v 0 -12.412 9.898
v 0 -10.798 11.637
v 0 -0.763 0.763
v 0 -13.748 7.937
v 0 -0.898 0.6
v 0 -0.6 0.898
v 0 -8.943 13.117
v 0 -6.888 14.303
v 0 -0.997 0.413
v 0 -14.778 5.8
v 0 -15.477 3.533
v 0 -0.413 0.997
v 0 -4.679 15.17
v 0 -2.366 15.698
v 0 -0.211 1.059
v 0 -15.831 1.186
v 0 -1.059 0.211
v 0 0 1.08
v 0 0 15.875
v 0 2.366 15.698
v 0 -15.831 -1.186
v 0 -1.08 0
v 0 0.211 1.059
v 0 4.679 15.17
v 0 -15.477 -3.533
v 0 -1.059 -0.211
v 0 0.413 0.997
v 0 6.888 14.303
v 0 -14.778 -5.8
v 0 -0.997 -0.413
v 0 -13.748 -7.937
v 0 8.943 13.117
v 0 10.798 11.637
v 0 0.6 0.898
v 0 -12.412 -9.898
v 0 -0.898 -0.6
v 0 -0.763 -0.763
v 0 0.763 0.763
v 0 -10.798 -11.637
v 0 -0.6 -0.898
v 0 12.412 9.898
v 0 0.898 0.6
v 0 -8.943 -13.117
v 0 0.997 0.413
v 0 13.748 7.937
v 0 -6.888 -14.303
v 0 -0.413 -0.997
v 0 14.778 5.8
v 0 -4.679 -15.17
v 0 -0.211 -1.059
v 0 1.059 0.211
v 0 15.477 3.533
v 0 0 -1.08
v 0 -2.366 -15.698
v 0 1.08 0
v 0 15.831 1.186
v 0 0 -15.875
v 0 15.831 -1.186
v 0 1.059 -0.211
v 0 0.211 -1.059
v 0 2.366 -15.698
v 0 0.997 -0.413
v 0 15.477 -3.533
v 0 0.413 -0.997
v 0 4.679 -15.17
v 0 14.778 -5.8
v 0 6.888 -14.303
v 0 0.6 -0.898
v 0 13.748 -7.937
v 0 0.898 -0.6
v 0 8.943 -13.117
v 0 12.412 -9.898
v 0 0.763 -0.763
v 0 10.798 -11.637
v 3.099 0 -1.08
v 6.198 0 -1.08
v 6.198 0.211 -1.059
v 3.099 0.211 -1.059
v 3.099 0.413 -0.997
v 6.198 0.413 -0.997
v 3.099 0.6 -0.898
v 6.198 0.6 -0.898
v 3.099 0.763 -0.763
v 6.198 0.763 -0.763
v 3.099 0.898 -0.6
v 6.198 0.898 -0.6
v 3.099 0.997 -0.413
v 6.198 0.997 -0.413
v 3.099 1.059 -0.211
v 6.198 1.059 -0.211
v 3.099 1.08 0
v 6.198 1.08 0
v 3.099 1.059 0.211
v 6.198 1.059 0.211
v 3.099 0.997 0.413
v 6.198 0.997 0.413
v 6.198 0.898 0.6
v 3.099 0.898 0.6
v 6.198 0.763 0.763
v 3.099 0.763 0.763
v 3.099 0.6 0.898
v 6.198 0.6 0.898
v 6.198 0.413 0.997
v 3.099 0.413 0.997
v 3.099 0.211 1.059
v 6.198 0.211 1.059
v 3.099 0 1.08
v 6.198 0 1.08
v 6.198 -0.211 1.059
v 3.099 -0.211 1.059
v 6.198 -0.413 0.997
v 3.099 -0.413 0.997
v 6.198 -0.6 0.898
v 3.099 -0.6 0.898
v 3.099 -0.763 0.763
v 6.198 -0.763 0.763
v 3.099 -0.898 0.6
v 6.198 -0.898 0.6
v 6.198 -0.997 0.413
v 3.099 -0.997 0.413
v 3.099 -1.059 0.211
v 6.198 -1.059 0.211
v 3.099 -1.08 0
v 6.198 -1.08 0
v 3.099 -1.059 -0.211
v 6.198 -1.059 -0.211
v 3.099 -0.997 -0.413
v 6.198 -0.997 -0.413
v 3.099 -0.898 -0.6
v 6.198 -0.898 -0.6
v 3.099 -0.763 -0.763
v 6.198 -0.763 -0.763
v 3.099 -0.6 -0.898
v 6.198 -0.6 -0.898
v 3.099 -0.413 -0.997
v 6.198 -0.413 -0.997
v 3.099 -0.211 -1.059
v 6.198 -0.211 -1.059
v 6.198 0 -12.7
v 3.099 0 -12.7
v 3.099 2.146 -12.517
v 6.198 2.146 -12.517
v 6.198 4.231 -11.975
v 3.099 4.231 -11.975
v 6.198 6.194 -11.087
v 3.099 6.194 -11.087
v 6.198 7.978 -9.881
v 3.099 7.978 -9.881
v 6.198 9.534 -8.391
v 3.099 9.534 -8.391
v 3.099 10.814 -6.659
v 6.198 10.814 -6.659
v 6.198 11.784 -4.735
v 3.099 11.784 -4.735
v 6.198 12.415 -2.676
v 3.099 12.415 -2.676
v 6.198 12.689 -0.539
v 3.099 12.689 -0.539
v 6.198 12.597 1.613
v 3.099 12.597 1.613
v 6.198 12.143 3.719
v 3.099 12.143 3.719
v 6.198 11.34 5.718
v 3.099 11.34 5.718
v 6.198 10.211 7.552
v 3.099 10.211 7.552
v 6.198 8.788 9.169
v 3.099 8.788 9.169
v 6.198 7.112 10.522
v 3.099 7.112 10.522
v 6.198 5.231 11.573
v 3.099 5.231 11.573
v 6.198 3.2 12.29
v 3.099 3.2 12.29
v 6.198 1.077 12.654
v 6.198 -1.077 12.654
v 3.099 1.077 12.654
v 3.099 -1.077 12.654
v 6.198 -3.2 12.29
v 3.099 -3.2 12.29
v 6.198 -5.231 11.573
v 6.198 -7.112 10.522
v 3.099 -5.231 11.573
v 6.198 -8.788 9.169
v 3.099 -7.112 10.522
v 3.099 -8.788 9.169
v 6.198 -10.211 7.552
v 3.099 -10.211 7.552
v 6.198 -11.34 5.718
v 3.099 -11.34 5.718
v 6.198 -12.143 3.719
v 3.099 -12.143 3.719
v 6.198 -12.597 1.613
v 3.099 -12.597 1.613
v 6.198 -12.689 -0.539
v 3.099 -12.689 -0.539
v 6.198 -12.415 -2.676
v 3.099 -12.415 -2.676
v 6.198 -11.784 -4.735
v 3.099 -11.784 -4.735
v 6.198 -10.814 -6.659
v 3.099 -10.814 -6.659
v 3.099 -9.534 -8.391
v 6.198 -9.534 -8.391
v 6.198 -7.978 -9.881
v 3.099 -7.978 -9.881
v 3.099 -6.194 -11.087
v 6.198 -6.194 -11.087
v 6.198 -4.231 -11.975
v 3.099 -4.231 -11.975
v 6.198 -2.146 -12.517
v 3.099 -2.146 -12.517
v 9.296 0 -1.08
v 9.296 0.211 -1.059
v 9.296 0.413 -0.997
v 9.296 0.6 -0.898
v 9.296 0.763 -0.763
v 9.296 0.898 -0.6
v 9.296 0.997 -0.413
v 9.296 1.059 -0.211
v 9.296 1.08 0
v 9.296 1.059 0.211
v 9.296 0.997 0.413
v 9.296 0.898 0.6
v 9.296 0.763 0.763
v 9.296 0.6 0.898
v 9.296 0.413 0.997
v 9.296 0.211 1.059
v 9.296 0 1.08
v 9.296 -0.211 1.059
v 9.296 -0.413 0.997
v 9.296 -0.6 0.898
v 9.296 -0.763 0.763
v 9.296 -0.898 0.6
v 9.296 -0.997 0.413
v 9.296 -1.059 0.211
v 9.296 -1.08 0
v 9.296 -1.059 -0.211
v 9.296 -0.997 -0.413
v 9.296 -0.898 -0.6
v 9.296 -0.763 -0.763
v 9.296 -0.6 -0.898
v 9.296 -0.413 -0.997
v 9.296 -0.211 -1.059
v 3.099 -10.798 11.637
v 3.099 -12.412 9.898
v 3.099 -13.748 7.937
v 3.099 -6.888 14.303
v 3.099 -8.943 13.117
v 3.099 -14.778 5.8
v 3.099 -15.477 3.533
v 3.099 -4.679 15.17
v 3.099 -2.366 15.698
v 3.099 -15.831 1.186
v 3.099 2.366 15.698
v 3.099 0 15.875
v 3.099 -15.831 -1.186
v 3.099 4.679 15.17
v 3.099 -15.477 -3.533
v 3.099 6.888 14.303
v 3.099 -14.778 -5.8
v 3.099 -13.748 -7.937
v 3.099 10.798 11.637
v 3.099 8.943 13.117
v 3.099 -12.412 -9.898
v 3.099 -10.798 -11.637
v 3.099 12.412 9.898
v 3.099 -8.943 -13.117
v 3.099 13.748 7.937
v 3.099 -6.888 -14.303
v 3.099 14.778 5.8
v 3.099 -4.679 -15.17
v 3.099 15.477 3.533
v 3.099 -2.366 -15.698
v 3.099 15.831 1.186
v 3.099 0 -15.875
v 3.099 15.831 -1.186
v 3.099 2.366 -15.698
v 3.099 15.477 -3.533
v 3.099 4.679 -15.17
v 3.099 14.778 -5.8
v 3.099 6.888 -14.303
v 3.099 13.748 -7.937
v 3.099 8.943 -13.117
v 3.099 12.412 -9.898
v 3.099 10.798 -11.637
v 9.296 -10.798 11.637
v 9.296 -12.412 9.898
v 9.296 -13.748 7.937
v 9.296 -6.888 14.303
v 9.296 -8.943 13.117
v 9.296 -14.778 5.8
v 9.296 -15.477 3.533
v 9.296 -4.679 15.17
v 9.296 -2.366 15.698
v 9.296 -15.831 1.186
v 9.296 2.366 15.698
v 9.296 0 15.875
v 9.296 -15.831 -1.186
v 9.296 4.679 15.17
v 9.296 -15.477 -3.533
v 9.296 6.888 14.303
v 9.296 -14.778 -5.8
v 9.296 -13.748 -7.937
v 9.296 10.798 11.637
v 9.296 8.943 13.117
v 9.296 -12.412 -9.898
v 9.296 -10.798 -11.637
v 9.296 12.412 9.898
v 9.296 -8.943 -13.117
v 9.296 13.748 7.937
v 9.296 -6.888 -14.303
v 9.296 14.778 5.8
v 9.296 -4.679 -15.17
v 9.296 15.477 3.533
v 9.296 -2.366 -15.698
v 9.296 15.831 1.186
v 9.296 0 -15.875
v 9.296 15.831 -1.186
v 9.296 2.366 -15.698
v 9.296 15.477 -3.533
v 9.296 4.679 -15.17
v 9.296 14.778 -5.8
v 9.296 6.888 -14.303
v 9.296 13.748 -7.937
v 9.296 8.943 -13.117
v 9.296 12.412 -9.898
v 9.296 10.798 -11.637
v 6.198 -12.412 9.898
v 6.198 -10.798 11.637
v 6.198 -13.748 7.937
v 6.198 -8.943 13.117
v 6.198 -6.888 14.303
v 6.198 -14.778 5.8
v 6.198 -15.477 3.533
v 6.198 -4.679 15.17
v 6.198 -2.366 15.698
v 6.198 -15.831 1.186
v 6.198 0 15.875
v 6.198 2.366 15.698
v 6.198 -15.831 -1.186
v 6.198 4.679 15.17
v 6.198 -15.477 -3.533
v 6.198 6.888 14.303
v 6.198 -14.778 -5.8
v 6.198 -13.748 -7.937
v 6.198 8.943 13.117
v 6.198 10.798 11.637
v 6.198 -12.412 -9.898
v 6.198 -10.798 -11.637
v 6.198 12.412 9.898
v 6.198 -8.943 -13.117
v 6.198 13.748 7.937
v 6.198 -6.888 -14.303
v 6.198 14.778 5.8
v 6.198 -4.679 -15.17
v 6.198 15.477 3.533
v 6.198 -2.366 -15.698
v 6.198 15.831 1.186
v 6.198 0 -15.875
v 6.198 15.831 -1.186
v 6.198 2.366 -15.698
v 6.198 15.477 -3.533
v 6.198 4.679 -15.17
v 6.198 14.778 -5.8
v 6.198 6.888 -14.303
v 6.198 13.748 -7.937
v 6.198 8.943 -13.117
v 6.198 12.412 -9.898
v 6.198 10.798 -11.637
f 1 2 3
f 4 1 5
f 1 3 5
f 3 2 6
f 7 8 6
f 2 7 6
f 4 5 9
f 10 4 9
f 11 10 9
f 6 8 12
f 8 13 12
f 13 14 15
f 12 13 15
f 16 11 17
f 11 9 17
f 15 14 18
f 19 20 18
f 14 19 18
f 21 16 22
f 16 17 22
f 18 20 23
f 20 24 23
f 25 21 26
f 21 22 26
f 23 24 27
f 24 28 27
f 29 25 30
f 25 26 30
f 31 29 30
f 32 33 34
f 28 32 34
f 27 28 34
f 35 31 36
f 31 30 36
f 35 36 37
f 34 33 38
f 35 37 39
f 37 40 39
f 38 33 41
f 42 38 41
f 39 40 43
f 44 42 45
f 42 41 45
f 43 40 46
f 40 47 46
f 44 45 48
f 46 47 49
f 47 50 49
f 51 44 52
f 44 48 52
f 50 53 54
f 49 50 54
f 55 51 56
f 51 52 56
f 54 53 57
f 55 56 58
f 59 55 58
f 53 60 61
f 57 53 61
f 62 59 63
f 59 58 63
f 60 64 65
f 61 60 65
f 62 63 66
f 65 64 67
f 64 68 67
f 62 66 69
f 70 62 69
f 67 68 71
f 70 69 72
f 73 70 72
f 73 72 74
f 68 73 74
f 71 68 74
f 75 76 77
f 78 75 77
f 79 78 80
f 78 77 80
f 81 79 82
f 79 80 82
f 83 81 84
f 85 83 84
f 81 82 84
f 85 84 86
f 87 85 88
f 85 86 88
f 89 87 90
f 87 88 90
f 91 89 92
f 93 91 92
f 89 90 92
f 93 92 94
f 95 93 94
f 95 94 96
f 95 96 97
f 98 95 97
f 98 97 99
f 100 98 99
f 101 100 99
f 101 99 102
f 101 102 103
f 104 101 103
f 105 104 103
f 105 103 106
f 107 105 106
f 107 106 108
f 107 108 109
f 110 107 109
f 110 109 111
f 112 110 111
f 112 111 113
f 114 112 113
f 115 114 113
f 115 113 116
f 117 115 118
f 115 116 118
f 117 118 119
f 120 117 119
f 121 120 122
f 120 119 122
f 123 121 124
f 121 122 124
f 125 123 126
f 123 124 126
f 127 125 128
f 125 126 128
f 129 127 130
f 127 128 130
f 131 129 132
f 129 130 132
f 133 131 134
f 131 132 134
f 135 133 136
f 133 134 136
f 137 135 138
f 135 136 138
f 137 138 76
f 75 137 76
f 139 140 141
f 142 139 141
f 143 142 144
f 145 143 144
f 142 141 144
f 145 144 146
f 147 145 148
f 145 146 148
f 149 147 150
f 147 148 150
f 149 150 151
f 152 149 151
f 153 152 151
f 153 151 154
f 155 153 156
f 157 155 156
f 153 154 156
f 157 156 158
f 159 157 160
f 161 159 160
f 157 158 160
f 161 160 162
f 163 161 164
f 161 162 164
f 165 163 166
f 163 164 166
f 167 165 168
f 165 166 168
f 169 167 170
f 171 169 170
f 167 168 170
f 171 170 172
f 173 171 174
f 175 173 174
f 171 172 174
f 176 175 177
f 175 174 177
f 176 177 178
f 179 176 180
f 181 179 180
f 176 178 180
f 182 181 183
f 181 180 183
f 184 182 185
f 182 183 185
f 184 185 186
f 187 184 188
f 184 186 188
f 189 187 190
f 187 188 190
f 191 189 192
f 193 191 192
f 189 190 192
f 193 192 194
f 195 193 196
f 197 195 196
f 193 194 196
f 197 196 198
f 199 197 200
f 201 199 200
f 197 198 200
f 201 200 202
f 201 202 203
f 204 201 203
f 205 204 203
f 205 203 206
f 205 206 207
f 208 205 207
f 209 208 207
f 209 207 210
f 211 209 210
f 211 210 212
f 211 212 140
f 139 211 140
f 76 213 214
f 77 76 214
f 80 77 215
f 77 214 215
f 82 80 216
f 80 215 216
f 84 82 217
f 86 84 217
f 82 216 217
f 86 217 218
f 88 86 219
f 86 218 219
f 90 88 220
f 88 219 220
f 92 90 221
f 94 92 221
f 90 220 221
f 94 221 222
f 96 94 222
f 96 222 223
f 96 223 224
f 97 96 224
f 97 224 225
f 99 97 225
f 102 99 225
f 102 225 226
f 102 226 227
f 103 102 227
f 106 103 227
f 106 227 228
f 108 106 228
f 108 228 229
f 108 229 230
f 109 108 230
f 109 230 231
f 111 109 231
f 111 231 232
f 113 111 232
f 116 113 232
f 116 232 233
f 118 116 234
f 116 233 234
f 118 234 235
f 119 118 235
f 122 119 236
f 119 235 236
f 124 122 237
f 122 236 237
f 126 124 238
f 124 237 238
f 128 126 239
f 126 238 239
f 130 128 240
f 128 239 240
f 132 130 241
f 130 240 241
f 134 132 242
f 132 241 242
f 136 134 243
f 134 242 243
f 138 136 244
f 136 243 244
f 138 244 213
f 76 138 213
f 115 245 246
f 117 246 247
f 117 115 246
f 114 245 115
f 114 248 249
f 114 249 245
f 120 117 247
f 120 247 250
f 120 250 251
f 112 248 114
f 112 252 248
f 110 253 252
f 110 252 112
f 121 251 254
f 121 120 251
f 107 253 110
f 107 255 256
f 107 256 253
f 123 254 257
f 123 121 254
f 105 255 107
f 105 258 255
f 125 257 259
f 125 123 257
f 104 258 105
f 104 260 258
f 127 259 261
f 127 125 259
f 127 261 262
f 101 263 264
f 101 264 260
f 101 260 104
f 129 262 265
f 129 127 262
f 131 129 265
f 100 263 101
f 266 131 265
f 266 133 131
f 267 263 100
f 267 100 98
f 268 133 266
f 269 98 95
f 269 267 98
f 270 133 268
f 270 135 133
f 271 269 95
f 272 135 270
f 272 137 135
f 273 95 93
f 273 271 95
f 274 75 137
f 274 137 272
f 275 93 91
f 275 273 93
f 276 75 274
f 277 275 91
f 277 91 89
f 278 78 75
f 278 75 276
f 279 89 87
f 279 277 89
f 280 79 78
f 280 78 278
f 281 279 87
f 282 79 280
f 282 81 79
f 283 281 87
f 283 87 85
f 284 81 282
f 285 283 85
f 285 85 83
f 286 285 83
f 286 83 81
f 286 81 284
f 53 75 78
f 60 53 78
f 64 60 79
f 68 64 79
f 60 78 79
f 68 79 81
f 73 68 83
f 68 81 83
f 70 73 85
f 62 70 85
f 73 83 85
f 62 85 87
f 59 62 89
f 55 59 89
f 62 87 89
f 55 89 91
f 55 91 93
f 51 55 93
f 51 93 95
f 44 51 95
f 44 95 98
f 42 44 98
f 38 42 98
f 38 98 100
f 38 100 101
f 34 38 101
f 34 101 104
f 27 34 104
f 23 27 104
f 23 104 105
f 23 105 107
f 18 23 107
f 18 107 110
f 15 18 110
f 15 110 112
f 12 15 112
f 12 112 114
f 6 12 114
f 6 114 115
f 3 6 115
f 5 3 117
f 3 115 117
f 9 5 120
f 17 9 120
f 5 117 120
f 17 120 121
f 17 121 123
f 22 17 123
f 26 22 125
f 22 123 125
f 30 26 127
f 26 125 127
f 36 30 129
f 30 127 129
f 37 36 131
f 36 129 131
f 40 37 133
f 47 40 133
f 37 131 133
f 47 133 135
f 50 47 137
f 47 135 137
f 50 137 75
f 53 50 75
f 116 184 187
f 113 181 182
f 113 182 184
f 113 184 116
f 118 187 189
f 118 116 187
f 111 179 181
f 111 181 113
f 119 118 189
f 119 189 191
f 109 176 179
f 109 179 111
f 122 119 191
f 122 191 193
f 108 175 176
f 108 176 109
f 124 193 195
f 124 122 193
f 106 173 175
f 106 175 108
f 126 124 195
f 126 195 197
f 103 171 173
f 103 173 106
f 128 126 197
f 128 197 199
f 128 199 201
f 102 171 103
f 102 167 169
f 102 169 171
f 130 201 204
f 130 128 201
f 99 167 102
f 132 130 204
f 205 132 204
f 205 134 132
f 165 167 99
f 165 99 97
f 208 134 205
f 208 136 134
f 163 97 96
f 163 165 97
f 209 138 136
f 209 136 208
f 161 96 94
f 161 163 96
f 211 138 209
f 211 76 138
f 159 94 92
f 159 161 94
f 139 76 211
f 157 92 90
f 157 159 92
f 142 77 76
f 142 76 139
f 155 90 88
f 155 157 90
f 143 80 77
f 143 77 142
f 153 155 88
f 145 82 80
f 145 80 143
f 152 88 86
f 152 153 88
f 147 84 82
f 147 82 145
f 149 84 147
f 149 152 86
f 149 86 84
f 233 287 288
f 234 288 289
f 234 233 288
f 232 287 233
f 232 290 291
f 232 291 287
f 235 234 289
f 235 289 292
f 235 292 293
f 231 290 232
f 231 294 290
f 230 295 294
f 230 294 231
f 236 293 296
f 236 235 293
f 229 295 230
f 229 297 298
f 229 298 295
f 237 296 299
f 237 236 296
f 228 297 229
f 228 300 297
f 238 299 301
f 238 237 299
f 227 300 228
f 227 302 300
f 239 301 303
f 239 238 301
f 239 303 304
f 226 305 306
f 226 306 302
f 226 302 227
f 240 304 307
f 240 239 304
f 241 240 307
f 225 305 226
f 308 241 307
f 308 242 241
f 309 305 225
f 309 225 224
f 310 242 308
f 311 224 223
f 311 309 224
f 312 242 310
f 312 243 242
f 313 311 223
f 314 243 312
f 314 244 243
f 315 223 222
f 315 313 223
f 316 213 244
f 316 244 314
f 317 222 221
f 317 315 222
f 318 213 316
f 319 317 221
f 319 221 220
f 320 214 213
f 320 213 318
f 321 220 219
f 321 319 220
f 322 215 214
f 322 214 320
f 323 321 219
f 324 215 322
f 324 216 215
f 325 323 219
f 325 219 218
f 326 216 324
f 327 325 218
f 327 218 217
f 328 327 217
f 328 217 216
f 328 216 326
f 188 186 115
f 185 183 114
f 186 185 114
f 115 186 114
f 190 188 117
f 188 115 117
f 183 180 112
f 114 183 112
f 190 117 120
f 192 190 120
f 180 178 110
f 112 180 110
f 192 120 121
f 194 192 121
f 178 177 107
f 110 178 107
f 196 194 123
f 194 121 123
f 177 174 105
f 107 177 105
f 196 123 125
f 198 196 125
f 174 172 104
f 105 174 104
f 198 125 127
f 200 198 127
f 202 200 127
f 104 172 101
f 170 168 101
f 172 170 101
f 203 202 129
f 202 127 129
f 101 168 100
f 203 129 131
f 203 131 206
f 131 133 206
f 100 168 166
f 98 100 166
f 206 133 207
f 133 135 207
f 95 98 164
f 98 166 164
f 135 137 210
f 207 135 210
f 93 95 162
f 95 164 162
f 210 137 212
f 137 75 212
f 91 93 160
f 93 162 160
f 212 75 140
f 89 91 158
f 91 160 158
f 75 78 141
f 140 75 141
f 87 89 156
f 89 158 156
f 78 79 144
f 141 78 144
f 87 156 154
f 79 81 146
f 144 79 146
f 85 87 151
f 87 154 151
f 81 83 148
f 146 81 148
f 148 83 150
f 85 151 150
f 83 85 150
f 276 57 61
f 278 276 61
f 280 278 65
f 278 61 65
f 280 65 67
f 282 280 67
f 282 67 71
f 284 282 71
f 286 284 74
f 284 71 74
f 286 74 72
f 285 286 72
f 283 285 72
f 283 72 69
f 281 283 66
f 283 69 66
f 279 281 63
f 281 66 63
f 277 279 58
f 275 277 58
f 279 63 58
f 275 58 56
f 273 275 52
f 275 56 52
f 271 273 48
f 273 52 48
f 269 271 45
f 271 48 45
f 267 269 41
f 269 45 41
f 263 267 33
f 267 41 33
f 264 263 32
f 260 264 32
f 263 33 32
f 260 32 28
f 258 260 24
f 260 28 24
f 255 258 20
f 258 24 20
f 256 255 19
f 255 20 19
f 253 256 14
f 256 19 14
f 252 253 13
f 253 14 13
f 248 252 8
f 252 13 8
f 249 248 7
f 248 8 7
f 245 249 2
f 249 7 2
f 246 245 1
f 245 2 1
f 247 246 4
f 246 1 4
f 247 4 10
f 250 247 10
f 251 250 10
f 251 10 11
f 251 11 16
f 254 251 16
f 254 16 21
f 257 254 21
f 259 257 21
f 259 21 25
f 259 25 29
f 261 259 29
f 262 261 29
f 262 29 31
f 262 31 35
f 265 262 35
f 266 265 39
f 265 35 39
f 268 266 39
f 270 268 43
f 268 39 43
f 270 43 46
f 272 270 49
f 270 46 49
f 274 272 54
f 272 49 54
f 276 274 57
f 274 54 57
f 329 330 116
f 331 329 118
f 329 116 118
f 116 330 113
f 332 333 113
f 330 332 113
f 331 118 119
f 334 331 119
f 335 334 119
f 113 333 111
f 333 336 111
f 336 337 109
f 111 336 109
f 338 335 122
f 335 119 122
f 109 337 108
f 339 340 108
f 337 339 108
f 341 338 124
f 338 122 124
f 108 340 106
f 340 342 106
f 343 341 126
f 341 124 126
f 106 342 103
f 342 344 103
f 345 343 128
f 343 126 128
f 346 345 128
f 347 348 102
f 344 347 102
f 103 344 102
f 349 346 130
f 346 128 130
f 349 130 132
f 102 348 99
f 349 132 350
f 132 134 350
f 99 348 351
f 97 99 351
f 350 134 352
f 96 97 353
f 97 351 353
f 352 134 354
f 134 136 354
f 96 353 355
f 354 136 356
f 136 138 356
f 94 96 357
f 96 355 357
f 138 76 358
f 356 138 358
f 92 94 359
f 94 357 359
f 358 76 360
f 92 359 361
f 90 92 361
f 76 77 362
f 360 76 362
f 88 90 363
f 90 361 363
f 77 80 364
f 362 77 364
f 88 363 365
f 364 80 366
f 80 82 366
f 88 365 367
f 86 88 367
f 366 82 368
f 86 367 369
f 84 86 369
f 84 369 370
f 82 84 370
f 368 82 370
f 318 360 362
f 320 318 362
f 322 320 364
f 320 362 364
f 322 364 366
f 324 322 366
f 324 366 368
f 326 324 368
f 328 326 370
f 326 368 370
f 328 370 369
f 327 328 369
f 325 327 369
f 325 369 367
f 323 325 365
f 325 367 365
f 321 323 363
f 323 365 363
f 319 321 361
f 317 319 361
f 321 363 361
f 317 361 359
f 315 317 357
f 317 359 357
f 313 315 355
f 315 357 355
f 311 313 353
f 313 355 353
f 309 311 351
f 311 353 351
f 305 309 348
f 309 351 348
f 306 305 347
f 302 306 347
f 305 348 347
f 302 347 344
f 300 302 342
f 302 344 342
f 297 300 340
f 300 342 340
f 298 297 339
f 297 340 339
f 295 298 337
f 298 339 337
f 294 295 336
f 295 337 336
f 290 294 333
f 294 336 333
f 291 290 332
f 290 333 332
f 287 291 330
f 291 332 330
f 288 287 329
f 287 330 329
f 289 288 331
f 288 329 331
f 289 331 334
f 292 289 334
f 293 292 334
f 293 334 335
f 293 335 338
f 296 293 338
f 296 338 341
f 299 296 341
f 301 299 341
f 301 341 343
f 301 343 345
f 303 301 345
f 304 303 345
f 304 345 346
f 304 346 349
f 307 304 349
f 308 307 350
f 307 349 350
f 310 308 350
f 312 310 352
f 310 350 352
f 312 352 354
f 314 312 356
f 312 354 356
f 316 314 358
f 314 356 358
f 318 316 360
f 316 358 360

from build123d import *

# Parameters (mm, degrees)
SKETCH3_R           = 15.875
BOSS_EXTRUDE1_DEPTH = 3.0988
SKETCH5_R           = 12.7
BOSS_EXTRUDE2_DEPTH = 3.0988
SKETCH6_R           = 15.875
BOSS_EXTRUDE3_DEPTH = 3.0988
SKETCH7_R           = 1.0795
CUT_EXTRUDE1_DEPTH  = 25.299265482


with BuildPart() as part:
    # Sketch3 → Boss-Extrude1 (new body)
    with BuildSketch(Plane(origin=(0, 0, 0), x_dir=(0, 0, -1), z_dir=(1, 0, 0))):
        Circle(SKETCH3_R)
    extrude(amount=BOSS_EXTRUDE1_DEPTH)


with BuildPart() as body_2:
    # Sketch5 → Boss-Extrude2 (new body)
    with BuildSketch(Plane(origin=(3.0988, 0, 0), x_dir=(0, 0, -1), z_dir=(1, 0, 0))):
        Circle(SKETCH5_R)
    extrude(amount=BOSS_EXTRUDE2_DEPTH)


with BuildPart() as body_3:
    # Sketch6 → Boss-Extrude3 (new body)
    with BuildSketch(Plane(origin=(6.1976, 0, 0), x_dir=(0, 0, -1), z_dir=(1, 0, 0))):
        Circle(SKETCH6_R)
    extrude(amount=BOSS_EXTRUDE3_DEPTH)


with BuildPart() as cut_extrude1_tool:
    # Sketch7 → Cut-Extrude1 (new, through all)
    with BuildSketch(Plane(origin=(9.2964, 0, 0), x_dir=(0, 0, -1), z_dir=(1, 0, 0))):
        Circle(SKETCH7_R)
    extrude(amount=-CUT_EXTRUDE1_DEPTH)


with BuildPart() as part_1:
    add(part.part)

    # Cut-Extrude1: cut by cut_extrude1_tool
    add(cut_extrude1_tool.part, mode=Mode.SUBTRACT)


with BuildPart() as body_2_1:
    add(body_2.part)

    # Cut-Extrude1: cut by cut_extrude1_tool
    add(cut_extrude1_tool.part, mode=Mode.SUBTRACT)


with BuildPart() as body_3_1:
    add(body_3.part)

    # Cut-Extrude1: cut by cut_extrude1_tool
    add(cut_extrude1_tool.part, mode=Mode.SUBTRACT)


solid = Compound([part_1.part, body_2_1.part, body_3_1.part])
